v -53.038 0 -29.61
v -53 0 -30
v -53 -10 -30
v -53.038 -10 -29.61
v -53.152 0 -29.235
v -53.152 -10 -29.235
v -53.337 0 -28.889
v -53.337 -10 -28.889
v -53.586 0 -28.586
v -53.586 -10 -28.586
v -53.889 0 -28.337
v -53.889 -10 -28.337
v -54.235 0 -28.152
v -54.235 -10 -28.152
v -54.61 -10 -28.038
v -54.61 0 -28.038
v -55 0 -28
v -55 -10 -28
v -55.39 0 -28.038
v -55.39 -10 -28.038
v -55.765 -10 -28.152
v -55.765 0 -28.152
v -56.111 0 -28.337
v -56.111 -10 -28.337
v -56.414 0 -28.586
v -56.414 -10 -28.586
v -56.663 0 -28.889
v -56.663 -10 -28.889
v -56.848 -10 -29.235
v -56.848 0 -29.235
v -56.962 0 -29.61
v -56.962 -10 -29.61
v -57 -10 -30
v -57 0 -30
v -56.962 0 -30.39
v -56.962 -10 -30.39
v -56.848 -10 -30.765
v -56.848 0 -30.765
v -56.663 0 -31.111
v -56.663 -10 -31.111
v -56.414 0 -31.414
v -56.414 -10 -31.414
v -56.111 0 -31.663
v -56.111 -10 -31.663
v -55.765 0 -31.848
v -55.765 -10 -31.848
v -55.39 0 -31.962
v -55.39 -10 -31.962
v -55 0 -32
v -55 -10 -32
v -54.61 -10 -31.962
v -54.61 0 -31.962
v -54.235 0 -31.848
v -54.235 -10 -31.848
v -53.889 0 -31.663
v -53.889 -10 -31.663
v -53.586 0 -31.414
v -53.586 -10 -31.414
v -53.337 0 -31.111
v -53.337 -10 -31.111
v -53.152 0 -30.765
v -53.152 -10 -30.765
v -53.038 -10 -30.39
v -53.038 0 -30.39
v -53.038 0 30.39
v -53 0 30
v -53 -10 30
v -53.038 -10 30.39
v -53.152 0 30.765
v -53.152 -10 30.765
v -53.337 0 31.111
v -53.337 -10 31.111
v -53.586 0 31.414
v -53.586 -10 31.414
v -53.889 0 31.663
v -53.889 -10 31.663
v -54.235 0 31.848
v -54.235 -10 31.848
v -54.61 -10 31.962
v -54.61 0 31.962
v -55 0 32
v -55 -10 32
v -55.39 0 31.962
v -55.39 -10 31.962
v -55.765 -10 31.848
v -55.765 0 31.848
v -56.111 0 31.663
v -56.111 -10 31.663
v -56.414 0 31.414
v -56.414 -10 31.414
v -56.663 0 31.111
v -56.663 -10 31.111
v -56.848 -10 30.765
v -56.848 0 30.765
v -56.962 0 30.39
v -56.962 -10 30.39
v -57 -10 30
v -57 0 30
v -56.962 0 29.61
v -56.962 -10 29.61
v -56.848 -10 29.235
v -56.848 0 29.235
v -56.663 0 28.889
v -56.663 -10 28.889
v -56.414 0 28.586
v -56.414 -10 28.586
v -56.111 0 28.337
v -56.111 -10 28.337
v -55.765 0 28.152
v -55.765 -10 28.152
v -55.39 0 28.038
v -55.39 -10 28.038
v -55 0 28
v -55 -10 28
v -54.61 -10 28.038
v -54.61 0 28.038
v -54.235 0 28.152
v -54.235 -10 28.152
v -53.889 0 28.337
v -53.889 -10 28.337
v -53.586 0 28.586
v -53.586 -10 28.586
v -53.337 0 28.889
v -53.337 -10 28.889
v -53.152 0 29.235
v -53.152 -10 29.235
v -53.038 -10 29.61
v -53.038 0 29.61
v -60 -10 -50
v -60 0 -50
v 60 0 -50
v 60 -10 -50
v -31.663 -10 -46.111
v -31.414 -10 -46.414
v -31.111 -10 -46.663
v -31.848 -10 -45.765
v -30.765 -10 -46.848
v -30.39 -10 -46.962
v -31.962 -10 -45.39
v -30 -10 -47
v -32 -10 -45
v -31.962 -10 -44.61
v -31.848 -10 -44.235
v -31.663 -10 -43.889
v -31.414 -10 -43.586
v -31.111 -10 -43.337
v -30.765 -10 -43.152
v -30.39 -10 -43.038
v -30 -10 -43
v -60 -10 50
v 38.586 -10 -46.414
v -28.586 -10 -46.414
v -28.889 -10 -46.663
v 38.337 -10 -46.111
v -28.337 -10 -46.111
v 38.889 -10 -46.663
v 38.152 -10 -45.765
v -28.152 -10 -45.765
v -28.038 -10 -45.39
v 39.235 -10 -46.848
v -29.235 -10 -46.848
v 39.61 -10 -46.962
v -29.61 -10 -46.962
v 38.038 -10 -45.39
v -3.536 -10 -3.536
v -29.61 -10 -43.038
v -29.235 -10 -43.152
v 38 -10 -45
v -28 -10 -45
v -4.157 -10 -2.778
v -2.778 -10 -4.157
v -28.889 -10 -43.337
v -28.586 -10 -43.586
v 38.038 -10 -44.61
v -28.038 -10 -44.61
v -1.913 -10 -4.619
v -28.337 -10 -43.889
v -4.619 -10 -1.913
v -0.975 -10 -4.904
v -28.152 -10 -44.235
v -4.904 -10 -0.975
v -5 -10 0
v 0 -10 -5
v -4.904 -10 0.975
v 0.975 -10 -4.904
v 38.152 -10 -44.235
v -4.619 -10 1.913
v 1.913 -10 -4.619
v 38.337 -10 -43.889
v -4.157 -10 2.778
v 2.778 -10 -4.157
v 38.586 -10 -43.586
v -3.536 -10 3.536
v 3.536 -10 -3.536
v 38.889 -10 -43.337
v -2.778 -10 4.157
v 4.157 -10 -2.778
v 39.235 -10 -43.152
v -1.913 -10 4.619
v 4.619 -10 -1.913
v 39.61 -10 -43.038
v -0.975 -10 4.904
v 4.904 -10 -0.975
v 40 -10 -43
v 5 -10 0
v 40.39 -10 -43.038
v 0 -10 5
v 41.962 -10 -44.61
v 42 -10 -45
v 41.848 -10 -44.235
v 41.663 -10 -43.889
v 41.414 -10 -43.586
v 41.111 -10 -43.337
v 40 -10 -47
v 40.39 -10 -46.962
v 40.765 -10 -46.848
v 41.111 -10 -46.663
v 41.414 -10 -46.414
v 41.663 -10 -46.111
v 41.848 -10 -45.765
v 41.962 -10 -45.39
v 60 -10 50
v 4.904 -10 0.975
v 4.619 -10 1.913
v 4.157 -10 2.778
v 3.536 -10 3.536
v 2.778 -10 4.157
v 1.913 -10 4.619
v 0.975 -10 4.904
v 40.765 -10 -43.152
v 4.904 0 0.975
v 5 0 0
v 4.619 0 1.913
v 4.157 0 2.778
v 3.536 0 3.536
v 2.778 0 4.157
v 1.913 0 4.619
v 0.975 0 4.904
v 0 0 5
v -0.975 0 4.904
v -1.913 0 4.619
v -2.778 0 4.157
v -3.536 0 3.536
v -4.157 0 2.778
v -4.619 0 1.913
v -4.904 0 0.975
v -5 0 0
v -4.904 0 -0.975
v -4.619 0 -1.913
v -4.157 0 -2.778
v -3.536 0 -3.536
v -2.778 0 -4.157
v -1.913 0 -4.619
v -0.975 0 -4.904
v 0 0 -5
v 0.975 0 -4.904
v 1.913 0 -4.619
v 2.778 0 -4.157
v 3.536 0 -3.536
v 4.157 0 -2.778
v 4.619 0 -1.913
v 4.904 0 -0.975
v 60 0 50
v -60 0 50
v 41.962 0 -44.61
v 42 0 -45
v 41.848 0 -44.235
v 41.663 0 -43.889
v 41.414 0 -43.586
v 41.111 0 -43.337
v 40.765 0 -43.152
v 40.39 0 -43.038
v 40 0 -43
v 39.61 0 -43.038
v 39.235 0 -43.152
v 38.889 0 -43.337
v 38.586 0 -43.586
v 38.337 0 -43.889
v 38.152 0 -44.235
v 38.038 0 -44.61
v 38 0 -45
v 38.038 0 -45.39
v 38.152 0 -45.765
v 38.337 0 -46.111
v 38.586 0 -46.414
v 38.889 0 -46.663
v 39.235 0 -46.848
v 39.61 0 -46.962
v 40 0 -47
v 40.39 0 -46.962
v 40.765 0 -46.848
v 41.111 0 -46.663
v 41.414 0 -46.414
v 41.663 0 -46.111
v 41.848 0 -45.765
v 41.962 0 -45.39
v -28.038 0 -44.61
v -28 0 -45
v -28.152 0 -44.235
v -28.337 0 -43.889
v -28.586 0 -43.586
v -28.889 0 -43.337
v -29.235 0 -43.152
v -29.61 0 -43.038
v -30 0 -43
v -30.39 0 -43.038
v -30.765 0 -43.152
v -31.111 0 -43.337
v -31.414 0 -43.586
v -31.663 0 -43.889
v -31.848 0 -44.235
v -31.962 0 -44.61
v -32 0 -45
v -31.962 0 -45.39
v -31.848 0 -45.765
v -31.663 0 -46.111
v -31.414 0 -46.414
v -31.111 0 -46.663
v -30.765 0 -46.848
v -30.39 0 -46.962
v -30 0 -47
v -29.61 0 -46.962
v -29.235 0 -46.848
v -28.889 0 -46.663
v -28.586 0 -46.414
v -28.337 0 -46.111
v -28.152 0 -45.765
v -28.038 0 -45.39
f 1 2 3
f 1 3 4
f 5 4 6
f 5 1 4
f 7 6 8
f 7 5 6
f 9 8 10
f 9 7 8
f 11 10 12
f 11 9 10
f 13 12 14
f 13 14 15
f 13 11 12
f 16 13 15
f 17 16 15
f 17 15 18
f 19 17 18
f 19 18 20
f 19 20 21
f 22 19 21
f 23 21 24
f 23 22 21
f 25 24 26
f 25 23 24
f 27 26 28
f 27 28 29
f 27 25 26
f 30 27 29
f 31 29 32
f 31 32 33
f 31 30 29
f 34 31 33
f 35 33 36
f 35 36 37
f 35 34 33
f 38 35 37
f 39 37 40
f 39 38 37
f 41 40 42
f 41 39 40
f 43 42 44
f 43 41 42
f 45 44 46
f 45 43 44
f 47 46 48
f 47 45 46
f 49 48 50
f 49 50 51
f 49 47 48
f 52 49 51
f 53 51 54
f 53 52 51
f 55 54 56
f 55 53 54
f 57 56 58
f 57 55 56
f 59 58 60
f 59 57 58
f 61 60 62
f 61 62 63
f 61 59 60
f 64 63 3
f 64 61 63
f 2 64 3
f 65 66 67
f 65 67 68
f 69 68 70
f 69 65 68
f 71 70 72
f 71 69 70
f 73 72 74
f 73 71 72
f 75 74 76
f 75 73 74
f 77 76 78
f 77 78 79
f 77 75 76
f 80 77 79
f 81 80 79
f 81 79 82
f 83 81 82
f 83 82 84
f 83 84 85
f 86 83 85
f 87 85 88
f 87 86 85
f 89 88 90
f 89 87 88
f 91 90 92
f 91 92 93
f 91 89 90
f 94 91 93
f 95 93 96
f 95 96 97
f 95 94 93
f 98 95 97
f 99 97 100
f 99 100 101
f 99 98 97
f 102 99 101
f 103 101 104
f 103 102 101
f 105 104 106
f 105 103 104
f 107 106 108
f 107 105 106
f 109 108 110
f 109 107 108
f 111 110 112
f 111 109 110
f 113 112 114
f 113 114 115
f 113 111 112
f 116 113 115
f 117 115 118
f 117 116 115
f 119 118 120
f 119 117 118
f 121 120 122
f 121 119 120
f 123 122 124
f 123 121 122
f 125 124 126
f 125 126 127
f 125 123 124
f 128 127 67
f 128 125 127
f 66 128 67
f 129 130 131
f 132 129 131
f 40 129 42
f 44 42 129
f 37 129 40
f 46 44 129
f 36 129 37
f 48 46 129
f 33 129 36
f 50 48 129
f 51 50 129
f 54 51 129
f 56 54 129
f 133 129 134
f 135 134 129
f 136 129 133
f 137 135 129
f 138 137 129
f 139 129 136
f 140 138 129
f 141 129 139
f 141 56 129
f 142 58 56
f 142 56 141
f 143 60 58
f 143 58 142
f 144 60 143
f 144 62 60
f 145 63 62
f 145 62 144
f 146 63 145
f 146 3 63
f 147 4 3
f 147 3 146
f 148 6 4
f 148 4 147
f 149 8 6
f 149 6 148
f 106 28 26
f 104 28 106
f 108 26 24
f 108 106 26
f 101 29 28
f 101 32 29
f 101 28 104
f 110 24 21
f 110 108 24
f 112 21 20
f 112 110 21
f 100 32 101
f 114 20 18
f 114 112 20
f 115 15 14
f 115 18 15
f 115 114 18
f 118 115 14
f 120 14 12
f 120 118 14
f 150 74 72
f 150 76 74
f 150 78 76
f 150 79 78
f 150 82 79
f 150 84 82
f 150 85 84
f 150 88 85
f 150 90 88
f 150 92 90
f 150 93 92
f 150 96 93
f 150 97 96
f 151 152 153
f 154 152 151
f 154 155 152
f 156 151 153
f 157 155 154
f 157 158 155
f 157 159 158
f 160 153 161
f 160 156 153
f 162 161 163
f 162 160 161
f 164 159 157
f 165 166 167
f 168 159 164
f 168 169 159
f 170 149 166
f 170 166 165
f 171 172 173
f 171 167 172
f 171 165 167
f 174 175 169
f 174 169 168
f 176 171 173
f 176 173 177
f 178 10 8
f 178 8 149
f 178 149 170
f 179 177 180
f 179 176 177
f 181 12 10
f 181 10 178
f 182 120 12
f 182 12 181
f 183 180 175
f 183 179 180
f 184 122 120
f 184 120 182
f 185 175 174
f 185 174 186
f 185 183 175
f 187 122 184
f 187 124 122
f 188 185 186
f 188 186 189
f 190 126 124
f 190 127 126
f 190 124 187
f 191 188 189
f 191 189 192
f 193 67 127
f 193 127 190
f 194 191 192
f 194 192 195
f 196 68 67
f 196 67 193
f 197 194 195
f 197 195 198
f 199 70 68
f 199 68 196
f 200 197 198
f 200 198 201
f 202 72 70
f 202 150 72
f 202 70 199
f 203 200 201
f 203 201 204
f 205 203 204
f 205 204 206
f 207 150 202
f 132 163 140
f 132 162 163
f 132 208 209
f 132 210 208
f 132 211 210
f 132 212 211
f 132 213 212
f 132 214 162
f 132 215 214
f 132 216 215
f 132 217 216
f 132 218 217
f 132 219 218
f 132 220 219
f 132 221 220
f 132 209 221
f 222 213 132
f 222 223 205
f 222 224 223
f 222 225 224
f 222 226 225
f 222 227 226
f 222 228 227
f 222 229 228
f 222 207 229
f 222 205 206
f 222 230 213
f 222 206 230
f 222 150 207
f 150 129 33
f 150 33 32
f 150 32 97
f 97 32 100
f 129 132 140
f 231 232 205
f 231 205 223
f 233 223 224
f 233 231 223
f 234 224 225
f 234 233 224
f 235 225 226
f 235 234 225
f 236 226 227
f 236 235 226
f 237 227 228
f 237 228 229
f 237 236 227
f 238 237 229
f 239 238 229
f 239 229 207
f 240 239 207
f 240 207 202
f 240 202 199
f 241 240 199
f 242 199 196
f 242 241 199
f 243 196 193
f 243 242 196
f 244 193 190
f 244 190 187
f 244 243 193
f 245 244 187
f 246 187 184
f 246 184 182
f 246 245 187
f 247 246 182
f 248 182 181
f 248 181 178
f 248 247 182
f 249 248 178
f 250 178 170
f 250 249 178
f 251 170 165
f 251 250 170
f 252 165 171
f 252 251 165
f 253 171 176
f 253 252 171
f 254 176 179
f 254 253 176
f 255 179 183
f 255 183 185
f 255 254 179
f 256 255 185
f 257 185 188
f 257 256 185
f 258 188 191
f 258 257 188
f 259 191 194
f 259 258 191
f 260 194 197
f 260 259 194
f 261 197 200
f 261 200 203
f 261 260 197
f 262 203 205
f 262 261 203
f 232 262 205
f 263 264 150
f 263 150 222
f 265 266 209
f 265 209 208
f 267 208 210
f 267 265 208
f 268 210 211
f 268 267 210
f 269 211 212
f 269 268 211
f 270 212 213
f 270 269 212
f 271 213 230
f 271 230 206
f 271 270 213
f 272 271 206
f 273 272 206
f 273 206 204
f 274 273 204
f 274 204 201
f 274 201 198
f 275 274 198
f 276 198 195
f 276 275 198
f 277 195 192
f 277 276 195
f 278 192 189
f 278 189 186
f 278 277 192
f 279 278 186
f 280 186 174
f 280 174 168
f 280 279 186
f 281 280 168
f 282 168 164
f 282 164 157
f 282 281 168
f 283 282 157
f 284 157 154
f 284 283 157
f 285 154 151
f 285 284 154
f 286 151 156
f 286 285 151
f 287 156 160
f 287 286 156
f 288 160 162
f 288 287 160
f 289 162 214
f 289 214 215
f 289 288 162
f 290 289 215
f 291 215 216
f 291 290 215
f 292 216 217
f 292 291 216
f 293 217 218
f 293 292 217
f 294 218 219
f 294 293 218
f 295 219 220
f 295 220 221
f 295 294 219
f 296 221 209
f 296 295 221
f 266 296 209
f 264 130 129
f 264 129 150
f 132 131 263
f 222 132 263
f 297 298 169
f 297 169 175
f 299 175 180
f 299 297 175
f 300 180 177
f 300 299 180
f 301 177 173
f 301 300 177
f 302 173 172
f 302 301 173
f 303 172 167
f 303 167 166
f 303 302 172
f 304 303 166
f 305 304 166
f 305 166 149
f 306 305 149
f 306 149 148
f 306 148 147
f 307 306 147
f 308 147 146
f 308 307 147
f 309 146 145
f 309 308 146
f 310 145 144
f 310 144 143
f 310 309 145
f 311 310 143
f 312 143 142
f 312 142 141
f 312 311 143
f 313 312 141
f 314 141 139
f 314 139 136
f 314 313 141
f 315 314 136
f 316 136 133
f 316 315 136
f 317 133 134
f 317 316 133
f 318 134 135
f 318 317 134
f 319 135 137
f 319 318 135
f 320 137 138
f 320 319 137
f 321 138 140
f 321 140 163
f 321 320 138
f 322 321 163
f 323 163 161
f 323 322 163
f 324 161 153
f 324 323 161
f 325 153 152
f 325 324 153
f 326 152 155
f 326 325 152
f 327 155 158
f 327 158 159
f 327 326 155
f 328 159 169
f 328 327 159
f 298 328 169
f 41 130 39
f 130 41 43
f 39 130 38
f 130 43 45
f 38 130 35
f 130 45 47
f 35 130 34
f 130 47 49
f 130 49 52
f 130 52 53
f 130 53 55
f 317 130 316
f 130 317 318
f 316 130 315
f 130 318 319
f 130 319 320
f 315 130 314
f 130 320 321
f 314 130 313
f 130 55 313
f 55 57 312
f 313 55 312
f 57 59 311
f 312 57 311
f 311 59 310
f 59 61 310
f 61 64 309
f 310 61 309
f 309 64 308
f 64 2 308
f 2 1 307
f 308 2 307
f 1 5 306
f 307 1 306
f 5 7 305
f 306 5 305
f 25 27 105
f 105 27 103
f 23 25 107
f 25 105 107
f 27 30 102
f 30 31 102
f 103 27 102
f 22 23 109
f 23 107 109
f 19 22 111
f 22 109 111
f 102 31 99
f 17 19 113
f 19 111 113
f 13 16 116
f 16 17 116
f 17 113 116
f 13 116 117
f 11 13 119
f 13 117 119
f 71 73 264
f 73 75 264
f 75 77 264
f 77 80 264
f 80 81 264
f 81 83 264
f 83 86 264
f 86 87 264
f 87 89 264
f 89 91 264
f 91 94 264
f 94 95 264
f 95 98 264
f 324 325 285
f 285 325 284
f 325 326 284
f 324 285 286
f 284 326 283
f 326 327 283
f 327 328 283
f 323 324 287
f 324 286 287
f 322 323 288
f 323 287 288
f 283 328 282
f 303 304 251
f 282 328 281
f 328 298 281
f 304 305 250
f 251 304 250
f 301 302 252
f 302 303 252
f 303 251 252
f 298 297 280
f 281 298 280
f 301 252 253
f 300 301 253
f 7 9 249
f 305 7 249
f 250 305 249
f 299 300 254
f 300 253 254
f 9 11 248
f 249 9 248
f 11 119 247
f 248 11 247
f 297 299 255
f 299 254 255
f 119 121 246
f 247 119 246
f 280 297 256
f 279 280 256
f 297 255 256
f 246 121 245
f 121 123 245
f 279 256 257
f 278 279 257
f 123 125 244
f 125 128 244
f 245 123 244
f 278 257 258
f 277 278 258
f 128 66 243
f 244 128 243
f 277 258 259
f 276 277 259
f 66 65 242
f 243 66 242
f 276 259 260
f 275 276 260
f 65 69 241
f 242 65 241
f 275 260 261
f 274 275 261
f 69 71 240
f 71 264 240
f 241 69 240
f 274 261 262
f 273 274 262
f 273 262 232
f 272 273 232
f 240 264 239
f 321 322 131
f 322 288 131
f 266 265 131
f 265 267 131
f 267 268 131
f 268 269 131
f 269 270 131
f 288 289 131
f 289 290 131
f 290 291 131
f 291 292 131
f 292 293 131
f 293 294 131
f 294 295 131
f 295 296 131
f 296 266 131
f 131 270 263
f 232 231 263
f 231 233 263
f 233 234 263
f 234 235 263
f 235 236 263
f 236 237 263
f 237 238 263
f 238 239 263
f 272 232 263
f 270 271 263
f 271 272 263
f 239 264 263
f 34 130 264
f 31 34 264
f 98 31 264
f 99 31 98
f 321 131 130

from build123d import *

# Parameters (mm, degrees)
F0_W     = 120
F0_H     = 100
F0_R     = 2
F0_R_2   = 5
F1_DEPTH = 10


with BuildPart() as f1:
    # F0 (on Front) → F1 (new body)
    with BuildSketch(Plane.XZ):
        Rectangle(F0_W, F0_H)
        with Locations((-55, -30)):
            Circle(F0_R, mode=Mode.SUBTRACT)
        with Locations((-30, -45)):
            Circle(F0_R, mode=Mode.SUBTRACT)
        with Locations((40, -45)):
            Circle(F0_R, mode=Mode.SUBTRACT)
        with Locations((-55, 30)):
            Circle(F0_R, mode=Mode.SUBTRACT)
        Circle(F0_R_2, mode=Mode.SUBTRACT)
    extrude(amount=F1_DEPTH)


solid = f1.part
